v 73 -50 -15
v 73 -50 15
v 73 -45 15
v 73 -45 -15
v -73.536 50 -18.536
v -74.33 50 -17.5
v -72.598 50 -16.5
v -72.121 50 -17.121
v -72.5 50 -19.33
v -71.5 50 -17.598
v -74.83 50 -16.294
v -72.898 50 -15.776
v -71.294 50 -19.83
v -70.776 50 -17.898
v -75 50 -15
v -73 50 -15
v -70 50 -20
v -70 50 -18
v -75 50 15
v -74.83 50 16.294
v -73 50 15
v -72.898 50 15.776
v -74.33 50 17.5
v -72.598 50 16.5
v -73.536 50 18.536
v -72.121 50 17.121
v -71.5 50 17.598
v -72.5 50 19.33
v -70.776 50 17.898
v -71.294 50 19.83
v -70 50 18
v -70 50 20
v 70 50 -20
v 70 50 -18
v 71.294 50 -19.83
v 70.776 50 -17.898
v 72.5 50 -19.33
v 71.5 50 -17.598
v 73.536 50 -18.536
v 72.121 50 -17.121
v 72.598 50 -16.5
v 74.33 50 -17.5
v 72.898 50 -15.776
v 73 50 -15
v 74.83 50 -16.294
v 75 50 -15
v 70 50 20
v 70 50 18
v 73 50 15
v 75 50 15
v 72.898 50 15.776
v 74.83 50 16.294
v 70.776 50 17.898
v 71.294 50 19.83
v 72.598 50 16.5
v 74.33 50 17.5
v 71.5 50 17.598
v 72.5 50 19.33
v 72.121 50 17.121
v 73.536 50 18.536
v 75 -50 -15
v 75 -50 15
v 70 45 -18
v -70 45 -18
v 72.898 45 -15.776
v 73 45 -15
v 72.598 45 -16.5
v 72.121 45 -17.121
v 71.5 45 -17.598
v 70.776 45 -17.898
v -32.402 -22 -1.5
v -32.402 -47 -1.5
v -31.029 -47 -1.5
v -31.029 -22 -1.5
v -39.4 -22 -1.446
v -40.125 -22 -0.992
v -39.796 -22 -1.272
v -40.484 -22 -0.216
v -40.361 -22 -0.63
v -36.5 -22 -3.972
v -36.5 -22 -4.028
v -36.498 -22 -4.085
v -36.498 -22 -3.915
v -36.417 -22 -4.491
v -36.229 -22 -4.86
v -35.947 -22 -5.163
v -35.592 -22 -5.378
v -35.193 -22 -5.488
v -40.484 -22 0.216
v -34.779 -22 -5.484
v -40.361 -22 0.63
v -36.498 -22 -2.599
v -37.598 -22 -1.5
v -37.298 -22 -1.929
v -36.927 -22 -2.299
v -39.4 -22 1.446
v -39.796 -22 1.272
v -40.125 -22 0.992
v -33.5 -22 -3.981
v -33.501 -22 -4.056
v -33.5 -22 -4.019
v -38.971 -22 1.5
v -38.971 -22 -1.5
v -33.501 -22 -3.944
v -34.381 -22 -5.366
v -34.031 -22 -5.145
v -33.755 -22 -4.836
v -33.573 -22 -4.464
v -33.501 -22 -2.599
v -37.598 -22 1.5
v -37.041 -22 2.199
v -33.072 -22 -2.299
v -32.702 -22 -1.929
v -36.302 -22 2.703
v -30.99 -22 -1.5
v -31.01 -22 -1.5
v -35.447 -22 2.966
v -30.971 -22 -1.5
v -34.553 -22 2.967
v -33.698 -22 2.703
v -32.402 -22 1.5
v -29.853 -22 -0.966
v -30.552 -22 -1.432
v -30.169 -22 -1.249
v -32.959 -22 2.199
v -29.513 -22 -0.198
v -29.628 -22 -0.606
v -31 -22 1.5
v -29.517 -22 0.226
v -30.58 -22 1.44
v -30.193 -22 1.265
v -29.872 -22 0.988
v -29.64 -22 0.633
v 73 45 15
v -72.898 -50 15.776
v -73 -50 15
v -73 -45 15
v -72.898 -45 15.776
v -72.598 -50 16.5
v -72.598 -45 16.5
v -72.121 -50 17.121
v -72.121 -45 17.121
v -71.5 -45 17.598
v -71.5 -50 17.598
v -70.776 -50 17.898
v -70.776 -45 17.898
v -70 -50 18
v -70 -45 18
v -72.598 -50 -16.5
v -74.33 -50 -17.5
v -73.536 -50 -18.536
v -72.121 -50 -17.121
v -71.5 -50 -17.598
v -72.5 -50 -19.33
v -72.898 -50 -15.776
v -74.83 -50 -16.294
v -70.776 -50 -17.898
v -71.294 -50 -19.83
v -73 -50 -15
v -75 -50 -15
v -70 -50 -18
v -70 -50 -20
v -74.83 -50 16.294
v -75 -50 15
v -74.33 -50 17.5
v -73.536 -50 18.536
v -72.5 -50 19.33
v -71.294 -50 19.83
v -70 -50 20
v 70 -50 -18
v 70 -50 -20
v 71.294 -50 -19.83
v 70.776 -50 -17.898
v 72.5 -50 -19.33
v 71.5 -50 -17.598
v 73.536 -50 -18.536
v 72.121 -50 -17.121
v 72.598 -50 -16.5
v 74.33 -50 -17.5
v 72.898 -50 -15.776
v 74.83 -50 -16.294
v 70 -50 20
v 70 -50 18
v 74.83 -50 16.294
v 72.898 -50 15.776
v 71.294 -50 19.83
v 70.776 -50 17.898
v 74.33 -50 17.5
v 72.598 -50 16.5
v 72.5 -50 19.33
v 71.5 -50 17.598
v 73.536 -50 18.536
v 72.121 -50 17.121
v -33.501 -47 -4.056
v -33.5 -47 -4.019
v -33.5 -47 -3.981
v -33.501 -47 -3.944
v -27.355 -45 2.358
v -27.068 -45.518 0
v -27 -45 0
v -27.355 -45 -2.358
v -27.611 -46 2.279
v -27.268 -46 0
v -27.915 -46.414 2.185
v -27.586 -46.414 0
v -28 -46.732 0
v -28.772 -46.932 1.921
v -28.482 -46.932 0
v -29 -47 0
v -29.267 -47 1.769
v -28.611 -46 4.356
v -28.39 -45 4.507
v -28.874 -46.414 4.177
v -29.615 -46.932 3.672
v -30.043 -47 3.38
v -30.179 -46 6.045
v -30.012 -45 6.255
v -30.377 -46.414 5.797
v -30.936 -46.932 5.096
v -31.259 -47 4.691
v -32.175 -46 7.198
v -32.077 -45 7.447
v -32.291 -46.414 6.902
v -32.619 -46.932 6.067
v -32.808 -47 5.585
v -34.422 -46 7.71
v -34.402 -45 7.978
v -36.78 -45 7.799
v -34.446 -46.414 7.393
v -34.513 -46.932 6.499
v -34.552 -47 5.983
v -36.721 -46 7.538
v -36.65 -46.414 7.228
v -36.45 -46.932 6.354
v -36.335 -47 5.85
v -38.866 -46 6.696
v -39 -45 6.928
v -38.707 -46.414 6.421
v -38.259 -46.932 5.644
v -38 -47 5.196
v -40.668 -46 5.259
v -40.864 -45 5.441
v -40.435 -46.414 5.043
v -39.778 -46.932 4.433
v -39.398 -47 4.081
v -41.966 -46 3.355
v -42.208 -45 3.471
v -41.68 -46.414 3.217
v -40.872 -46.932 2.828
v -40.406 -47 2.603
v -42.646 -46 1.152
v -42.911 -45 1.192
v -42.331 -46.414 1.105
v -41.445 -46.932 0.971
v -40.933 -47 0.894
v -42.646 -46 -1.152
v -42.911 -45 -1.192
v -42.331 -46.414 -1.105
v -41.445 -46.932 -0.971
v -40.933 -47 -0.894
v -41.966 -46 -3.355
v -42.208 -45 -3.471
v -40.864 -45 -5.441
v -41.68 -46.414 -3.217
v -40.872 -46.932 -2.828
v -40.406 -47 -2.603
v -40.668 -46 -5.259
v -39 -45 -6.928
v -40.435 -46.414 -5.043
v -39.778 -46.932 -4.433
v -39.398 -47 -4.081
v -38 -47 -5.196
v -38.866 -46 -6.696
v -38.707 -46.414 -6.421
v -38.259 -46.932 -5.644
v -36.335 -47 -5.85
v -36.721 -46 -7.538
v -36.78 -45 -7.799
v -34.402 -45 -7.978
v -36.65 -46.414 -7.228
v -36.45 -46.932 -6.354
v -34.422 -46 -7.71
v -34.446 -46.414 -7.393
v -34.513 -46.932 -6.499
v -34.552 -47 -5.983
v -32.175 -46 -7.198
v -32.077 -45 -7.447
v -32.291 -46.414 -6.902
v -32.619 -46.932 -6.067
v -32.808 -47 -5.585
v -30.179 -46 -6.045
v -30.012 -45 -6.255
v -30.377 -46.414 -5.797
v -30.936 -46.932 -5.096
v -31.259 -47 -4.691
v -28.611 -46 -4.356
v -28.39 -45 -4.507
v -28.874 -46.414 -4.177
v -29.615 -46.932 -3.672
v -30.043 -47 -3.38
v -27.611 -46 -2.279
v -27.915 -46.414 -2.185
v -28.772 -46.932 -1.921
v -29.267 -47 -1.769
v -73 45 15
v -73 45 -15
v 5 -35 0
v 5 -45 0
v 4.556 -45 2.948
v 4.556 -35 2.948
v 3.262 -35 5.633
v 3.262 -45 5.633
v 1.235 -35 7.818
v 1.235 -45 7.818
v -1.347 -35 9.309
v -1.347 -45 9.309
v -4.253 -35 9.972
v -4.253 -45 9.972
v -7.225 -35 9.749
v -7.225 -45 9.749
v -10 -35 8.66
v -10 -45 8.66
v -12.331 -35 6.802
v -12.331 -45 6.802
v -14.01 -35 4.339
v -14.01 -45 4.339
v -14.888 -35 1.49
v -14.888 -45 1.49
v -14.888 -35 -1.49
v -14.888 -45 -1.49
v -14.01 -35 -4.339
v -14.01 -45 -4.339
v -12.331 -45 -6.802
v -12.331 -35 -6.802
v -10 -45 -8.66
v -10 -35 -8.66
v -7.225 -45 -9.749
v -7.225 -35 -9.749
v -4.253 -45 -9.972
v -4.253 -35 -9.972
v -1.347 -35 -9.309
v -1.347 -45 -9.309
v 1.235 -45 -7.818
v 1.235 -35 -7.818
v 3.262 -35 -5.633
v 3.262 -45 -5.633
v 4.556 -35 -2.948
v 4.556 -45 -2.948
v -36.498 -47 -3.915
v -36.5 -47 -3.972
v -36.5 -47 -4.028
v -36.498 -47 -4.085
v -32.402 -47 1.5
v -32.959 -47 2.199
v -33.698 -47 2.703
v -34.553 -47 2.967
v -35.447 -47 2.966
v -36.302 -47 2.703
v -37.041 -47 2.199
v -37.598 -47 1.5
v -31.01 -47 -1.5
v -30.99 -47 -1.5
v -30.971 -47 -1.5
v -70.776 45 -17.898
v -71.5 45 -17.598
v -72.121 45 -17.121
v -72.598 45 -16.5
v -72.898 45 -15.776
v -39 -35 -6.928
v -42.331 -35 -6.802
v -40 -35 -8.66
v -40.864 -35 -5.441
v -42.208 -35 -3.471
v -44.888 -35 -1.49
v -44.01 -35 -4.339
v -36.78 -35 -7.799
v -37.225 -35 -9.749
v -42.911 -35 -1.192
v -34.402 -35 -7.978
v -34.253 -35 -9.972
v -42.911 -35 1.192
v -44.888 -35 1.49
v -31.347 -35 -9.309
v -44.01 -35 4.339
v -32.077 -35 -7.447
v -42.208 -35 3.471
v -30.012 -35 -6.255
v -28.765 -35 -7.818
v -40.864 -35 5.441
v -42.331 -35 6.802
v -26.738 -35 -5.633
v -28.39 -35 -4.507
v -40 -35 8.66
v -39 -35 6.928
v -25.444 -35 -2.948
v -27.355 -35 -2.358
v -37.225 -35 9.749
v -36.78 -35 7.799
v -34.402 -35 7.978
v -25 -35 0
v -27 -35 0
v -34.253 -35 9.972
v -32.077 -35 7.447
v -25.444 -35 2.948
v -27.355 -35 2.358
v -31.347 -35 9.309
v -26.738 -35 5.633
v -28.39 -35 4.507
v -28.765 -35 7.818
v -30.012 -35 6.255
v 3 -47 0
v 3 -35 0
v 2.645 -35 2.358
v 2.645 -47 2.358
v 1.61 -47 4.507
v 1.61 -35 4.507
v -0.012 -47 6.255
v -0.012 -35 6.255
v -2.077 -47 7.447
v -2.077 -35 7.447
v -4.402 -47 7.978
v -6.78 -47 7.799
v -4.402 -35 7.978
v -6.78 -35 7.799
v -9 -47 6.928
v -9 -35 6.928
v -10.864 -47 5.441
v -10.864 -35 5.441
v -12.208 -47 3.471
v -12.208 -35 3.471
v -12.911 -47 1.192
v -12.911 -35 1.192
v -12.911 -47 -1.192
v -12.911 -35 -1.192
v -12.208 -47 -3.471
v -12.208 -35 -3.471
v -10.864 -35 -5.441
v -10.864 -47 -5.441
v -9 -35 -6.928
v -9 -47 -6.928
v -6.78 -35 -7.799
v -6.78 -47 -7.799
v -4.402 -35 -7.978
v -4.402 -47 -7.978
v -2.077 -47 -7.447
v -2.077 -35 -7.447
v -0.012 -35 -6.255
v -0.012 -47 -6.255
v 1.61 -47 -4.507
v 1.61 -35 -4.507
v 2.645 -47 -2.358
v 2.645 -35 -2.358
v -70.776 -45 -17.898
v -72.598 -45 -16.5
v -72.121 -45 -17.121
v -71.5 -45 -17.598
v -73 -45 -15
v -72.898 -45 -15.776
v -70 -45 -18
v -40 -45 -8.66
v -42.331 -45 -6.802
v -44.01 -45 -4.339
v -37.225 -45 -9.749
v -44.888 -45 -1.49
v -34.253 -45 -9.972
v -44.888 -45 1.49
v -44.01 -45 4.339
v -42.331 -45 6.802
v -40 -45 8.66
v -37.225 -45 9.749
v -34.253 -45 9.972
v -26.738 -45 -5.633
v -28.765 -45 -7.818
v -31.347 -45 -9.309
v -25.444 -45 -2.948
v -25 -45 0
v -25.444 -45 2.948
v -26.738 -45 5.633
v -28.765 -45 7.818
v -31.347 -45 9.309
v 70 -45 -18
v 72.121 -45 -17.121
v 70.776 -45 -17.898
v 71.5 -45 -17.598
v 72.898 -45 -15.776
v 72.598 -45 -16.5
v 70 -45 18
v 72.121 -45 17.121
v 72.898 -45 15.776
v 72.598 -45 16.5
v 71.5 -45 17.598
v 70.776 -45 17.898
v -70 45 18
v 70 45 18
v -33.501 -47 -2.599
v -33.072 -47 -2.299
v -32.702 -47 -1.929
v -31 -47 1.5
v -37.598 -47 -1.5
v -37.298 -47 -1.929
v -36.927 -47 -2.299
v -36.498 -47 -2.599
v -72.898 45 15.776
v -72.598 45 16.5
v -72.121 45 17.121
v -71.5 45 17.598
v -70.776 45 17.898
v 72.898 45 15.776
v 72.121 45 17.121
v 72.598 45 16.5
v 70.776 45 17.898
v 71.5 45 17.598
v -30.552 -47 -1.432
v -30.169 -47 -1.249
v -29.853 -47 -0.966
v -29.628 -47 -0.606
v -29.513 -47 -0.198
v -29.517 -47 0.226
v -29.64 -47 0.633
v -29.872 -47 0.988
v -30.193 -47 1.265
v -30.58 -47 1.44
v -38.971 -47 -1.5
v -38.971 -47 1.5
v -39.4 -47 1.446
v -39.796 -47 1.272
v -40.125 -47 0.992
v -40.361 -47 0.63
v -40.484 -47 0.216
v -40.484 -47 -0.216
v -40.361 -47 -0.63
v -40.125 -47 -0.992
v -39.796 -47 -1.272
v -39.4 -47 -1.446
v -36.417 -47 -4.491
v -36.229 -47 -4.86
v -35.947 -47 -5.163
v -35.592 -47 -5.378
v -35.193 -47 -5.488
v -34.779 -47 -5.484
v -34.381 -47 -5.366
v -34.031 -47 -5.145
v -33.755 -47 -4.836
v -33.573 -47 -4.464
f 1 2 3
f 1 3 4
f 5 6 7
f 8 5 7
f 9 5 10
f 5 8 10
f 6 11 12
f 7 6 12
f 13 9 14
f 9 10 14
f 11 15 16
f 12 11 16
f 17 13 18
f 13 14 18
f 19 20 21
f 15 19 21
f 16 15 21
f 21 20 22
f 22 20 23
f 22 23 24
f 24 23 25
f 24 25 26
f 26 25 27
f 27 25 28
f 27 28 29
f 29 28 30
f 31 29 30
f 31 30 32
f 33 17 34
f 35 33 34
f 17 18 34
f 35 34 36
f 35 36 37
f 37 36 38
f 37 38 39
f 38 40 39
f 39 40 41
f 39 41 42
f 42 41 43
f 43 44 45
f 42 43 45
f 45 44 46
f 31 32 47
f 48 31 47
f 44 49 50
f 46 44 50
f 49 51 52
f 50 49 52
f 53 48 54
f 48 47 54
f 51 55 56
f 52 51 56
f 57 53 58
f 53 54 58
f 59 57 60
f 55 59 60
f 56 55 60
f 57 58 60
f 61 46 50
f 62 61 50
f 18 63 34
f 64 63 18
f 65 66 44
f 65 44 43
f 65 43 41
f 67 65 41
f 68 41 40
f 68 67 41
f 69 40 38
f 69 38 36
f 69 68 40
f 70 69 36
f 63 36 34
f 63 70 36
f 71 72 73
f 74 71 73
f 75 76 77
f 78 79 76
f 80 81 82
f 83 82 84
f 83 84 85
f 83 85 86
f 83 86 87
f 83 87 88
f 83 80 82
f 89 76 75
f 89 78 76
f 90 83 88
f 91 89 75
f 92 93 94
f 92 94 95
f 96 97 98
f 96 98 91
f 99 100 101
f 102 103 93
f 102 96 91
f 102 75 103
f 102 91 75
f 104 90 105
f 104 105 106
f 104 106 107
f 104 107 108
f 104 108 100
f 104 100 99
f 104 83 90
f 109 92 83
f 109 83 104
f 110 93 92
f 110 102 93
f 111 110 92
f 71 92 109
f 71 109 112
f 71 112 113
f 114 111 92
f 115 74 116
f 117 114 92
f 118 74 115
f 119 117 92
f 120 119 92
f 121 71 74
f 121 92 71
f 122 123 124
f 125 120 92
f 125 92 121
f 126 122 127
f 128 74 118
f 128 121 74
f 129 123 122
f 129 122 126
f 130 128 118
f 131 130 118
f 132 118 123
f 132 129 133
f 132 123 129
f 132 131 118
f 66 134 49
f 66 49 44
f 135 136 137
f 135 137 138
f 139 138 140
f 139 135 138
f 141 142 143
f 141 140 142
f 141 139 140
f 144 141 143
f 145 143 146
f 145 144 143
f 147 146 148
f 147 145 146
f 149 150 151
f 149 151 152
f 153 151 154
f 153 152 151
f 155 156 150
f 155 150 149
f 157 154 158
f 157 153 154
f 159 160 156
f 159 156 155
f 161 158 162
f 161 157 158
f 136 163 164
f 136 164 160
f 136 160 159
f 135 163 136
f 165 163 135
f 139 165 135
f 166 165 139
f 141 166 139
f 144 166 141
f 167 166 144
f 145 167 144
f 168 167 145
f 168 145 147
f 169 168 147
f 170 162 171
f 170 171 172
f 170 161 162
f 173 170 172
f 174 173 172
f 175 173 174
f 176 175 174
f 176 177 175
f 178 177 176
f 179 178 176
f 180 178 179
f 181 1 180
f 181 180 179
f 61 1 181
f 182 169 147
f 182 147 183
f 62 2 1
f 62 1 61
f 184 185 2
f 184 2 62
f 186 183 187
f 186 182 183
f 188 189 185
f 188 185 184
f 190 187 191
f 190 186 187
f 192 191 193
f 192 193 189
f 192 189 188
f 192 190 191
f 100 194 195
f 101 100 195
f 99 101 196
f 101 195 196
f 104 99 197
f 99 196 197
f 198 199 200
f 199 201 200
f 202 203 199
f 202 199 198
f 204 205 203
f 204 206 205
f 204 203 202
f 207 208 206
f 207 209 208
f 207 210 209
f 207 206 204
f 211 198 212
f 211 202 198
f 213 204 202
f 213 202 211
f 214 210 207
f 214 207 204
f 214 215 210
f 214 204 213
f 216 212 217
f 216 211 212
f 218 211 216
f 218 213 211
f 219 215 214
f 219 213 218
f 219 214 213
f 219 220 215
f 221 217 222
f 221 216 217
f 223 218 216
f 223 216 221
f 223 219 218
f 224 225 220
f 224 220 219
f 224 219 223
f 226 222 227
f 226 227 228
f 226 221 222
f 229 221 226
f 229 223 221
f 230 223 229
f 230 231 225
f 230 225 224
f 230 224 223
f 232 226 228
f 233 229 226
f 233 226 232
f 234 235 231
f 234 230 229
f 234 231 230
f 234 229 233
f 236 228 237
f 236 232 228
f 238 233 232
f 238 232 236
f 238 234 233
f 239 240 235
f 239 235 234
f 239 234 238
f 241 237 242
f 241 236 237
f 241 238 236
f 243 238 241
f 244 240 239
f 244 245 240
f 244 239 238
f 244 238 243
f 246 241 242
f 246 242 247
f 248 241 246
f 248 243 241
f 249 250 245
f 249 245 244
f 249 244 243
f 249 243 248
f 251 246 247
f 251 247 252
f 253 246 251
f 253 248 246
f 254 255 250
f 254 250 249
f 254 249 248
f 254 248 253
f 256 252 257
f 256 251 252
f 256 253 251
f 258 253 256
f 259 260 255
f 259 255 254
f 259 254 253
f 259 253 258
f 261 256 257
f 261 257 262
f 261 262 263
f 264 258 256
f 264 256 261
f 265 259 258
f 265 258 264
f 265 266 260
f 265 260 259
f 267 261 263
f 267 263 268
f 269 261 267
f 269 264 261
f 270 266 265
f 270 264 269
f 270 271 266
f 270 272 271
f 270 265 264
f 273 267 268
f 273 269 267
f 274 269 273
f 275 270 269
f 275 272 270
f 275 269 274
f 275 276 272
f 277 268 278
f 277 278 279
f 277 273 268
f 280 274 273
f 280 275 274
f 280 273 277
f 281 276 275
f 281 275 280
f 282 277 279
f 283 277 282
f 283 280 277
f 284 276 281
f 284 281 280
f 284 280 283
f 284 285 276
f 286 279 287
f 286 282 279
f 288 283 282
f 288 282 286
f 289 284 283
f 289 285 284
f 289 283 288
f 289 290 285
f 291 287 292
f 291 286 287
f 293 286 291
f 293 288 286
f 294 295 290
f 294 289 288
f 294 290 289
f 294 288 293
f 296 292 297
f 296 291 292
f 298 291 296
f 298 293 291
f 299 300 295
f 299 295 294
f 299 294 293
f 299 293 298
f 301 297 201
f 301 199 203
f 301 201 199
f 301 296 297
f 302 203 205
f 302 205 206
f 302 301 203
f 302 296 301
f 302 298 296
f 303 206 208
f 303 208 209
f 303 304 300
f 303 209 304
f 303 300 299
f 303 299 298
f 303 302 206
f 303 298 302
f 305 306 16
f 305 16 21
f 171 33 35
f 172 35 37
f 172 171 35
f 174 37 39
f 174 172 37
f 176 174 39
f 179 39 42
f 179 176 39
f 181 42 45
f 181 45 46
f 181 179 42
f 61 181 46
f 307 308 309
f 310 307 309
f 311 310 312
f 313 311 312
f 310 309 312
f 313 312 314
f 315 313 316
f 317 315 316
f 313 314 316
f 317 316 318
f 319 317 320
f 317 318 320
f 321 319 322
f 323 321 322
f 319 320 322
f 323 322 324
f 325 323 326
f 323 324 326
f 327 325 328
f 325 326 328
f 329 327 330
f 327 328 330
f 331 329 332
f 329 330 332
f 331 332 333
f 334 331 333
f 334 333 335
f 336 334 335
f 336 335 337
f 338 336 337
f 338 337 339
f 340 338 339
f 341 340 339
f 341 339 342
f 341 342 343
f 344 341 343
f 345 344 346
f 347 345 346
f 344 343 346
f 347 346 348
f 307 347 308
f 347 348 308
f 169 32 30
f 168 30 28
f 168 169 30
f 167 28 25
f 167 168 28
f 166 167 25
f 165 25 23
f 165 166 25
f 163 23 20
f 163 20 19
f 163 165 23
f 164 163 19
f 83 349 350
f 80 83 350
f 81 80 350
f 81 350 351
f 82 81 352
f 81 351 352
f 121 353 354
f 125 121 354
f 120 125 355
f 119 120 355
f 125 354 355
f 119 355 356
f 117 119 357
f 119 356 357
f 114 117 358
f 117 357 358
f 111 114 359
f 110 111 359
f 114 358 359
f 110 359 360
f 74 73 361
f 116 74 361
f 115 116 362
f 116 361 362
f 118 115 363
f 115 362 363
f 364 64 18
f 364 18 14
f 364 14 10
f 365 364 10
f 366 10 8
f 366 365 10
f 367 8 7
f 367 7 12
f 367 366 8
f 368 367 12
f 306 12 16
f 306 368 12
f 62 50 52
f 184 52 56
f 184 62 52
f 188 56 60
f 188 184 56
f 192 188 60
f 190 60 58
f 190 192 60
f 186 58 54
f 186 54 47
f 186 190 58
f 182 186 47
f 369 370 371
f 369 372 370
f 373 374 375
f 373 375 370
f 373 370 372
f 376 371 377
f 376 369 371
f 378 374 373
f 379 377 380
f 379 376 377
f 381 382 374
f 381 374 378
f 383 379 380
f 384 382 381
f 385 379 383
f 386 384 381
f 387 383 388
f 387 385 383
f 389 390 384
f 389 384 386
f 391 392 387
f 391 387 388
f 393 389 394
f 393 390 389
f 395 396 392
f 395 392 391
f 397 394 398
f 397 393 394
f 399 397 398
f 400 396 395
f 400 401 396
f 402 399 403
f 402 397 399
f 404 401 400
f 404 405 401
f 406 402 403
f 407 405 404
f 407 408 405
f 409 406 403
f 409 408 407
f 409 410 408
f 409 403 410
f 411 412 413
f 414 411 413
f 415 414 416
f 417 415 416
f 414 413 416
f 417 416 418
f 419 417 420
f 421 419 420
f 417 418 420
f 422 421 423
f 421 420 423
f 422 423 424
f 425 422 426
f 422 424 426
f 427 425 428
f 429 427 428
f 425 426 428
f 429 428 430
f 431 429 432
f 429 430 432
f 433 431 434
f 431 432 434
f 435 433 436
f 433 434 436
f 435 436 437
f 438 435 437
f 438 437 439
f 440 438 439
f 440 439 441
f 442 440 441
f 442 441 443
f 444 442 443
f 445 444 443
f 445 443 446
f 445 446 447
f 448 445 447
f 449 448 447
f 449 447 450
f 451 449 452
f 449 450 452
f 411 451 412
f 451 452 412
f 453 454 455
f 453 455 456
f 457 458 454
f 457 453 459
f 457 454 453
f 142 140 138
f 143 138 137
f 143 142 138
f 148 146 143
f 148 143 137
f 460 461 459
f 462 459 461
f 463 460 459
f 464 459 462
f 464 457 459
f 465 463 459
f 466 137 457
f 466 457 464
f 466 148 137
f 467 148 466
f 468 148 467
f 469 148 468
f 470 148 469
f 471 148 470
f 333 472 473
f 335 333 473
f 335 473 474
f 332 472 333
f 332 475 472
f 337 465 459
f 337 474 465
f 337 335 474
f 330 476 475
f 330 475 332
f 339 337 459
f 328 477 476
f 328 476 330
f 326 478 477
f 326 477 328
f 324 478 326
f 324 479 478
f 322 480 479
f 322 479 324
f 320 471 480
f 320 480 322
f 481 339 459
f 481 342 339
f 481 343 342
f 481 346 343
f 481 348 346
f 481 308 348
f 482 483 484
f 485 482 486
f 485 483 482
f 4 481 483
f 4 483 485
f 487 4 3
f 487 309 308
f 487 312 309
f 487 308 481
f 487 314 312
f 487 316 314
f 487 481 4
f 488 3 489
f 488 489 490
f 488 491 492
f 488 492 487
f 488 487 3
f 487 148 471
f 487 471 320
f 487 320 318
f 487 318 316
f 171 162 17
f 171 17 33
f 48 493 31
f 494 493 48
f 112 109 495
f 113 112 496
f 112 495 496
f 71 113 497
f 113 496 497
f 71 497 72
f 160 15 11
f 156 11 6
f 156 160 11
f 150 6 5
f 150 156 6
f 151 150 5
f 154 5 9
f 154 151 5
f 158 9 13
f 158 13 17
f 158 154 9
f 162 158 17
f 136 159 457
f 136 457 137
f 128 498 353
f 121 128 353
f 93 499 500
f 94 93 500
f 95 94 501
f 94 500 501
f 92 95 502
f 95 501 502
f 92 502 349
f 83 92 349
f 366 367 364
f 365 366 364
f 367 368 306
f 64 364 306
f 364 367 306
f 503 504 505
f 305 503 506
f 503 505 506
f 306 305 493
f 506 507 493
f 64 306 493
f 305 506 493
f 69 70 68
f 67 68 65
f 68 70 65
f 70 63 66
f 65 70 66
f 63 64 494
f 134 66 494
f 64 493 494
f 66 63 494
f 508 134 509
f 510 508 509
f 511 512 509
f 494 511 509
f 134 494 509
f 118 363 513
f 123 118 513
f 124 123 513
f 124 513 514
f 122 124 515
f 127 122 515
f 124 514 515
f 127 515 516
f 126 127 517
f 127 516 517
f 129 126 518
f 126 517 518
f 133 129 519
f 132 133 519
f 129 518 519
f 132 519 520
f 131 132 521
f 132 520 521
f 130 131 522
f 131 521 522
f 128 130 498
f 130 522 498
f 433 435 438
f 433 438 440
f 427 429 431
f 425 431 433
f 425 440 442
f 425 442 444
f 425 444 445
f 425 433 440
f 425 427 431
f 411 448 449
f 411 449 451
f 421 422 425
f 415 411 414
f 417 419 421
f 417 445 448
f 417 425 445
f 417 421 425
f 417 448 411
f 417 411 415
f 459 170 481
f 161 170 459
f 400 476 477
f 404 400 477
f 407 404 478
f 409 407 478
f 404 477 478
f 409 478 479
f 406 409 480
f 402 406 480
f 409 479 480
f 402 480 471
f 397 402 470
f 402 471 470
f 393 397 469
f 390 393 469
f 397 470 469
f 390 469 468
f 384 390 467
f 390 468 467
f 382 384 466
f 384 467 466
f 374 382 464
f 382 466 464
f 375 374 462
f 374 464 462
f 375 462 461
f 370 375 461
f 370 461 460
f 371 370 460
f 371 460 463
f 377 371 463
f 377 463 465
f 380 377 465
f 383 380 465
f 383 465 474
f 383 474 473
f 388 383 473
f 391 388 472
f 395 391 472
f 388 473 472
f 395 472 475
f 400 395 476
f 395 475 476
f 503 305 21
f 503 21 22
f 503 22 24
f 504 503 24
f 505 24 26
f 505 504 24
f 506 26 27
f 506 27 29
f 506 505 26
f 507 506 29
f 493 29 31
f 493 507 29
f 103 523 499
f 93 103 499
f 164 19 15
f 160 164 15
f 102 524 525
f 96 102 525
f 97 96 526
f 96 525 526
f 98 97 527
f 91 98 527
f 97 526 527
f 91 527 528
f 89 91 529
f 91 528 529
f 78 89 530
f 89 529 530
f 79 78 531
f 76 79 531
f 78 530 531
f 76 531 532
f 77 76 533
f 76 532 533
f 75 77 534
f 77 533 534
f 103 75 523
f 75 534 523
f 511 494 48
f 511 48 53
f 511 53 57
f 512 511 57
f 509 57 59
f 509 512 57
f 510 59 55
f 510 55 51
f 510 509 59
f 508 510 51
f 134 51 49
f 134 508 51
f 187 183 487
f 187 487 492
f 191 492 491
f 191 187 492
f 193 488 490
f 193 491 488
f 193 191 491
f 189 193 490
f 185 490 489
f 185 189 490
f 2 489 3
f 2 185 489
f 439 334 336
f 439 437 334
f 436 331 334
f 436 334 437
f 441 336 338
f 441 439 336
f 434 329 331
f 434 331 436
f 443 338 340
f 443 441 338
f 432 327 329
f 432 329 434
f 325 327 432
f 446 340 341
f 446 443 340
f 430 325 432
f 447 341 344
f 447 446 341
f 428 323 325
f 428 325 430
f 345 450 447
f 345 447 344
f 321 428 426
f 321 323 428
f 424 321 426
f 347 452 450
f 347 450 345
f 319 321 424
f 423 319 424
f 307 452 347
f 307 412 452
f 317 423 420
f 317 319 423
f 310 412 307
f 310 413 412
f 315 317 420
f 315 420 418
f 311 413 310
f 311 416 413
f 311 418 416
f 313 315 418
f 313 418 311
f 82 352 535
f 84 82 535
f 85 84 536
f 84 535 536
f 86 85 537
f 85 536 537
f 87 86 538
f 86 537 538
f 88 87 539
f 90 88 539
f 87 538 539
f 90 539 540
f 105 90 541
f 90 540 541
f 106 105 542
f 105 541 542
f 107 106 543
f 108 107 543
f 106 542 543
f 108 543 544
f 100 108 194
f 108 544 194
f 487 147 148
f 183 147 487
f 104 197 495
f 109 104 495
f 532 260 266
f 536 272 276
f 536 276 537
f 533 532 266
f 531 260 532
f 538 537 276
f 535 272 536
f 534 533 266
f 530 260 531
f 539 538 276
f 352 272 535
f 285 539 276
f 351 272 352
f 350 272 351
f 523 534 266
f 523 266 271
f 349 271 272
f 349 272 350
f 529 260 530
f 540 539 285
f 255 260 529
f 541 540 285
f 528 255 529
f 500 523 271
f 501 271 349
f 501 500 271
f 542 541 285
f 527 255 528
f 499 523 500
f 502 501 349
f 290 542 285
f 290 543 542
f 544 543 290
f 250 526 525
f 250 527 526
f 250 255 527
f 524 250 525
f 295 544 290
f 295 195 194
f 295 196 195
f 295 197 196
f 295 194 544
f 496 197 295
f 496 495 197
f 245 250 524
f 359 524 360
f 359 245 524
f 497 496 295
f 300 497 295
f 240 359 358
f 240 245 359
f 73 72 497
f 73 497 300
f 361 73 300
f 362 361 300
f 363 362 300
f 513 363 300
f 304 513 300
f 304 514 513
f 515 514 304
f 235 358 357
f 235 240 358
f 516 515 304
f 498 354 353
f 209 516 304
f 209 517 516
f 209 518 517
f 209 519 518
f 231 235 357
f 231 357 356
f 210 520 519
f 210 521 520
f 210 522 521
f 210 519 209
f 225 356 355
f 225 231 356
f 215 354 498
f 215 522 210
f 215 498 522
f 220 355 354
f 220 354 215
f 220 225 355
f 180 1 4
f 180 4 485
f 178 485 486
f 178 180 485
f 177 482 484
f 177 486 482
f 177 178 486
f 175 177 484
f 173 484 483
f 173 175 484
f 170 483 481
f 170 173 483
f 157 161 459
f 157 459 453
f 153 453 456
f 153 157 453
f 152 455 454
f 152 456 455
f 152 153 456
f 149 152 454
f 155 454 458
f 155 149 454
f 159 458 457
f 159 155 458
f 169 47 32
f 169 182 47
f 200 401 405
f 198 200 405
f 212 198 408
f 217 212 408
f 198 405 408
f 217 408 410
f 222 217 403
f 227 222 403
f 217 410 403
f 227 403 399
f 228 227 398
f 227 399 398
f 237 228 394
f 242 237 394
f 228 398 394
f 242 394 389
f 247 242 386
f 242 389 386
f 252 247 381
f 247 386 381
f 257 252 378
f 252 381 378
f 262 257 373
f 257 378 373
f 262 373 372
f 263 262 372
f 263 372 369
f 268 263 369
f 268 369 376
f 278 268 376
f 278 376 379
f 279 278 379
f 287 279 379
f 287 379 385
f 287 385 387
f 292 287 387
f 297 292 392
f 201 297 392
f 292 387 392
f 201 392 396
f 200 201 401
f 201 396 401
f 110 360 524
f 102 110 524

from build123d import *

# Parameters (mm, degrees)
F1_DEPTH = 50
F3_DEPTH = 45
F4_R     = 10
F5_DEPTH = 10
F6_R     = 8
F7_DEPTH = 12
F9_DEPTH = 25
F10_R    = 2


with BuildPart() as f1:
    # F0 (on Front) → F1 (new body, symmetric)
    with BuildSketch(Plane.XZ):
        with BuildLine():
            ThreePointArc((-75, -15), (-73.535534, -18.535534), (-70, -20))
            Line((-70, -20), (70, -20))
            ThreePointArc((70, -20), (73.535534, -18.535534), (75, -15))
            Line((75, -15), (75, 15))
            ThreePointArc((75, 15), (73.535534, 18.535534), (70, 20))
            Line((70, 20), (-70, 20))
            ThreePointArc((-70, 20), (-73.535534, 18.535534), (-75, 15))
            Line((-75, 15), (-75, -15))
        make_face()
        with BuildLine():
            Line((73, 15), (73, -15))
            ThreePointArc((73, -15), (72.12132, -17.12132), (70, -18))
            Line((70, -18), (-70, -18))
            ThreePointArc((-70, -18), (-72.12132, -17.12132), (-73, -15))
            Line((-73, -15), (-73, 15))
            ThreePointArc((-73, 15), (-72.12132, 17.12132), (-70, 18))
            Line((-70, 18), (70, 18))
            ThreePointArc((70, 18), (72.12132, 17.12132), (73, 15))
        make_face(mode=Mode.SUBTRACT)
    extrude(amount=F1_DEPTH, both=True)

    # F2 (on Front) → F3 (join, symmetric)
    with BuildSketch(Plane.XZ):
        with BuildLine():
            Line((-73, 15), (-73, -15))
            ThreePointArc((-73, -15), (-72.12132, -17.12132), (-70, -18))
            Line((-70, -18), (70, -18))
            ThreePointArc((70, -18), (72.12132, -17.12132), (73, -15))
            Line((73, -15), (73, 15))
            ThreePointArc((73, 15), (72.12132, 17.12132), (70, 18))
            Line((70, 18), (-70, 18))
            ThreePointArc((-70, 18), (-72.12132, 17.12132), (-73, 15))
        make_face()
    extrude(amount=F3_DEPTH, both=True)

    # F4 (on face) → F5 (cut)
    with BuildSketch(Plane.XZ.offset(45)):
        with Locations((-35, 0)):
            Circle(F4_R)
        with Locations((-5, 0)):
            Circle(F4_R)
    extrude(amount=-F5_DEPTH, mode=Mode.SUBTRACT)

    # F6 (on face) → F7 (join)
    with BuildSketch(Plane.XZ.offset(35)):
        with Locations((-5, 0)):
            Circle(F6_R)
        with Locations((-35, 0)):
            Circle(F6_R)
    extrude(amount=F7_DEPTH)

    # F8 (on face) → F9 (cut)
    with BuildSketch(Plane.XZ.offset(47)):
        with BuildLine():
            Line((-38.971294, -1.499725), (-37.598235, -1.499725))
            ThreePointArc((-37.598235, -1.499725), (-37.120455, -2.122186), (-36.497605, -2.599457))
            Line((-36.497605, -2.599457), (-36.497605, -3.91527))
            Line((-36.497605, -3.91527), (-36.497605, -4.08473))
            ThreePointArc((-36.497605, -4.08473), (-34.985556, -5.49993), (-33.501041, -4.055874))
            Line((-33.501041, -4.055874), (-33.501041, -3.944126))
            Line((-33.501041, -3.944126), (-33.501041, -2.598677))
            ThreePointArc((-33.501041, -2.598677), (-32.878992, -2.121633), (-32.401765, -1.499725))
            Line((-32.401765, -1.499725), (-31.028708, -1.499725))
            Line((-31.028708, -1.499725), (-30.971292, -1.499725))
            ThreePointArc((-30.971292, -1.499725), (-29.500069, 0.01438), (-31.000052, 1.5))
            Line((-31.000052, 1.5), (-32.401896, 1.499952))
            ThreePointArc((-32.401896, 1.499952), (-35.000103, 3), (-37.598207, 1.499773))
            Line((-37.598207, 1.499773), (-38.971294, 1.499725))
            ThreePointArc((-38.971294, 1.499725), (-40.5, 0), (-38.971294, -1.499725))
        make_face()
        with BuildLine():
            Line((-36.497605, -4.08473), (-36.497605, -3.91527))
            ThreePointArc((-36.497605, -3.91527), (-36.5, -4), (-36.497605, -4.08473))
        make_face()
        with BuildLine():
            Line((-33.501041, -3.944126), (-33.501041, -4.055874))
            ThreePointArc((-33.501041, -4.055874), (-33.5, -4), (-33.501041, -3.944126))
        make_face()
        with BuildLine():
            ThreePointArc((-31.028708, -1.499725), (-31, -1.5), (-30.971292, -1.499725))
            Line((-30.971292, -1.499725), (-31.028708, -1.499725))
        make_face()
    extrude(amount=-F9_DEPTH, mode=Mode.SUBTRACT)

    # F10
    f10_edges = [f1.edges().sort_by_distance(p)[0] for p in [
        (-43, -47, 0),
    ]]
    fillet(f10_edges, radius=F10_R)


solid = f1.part
